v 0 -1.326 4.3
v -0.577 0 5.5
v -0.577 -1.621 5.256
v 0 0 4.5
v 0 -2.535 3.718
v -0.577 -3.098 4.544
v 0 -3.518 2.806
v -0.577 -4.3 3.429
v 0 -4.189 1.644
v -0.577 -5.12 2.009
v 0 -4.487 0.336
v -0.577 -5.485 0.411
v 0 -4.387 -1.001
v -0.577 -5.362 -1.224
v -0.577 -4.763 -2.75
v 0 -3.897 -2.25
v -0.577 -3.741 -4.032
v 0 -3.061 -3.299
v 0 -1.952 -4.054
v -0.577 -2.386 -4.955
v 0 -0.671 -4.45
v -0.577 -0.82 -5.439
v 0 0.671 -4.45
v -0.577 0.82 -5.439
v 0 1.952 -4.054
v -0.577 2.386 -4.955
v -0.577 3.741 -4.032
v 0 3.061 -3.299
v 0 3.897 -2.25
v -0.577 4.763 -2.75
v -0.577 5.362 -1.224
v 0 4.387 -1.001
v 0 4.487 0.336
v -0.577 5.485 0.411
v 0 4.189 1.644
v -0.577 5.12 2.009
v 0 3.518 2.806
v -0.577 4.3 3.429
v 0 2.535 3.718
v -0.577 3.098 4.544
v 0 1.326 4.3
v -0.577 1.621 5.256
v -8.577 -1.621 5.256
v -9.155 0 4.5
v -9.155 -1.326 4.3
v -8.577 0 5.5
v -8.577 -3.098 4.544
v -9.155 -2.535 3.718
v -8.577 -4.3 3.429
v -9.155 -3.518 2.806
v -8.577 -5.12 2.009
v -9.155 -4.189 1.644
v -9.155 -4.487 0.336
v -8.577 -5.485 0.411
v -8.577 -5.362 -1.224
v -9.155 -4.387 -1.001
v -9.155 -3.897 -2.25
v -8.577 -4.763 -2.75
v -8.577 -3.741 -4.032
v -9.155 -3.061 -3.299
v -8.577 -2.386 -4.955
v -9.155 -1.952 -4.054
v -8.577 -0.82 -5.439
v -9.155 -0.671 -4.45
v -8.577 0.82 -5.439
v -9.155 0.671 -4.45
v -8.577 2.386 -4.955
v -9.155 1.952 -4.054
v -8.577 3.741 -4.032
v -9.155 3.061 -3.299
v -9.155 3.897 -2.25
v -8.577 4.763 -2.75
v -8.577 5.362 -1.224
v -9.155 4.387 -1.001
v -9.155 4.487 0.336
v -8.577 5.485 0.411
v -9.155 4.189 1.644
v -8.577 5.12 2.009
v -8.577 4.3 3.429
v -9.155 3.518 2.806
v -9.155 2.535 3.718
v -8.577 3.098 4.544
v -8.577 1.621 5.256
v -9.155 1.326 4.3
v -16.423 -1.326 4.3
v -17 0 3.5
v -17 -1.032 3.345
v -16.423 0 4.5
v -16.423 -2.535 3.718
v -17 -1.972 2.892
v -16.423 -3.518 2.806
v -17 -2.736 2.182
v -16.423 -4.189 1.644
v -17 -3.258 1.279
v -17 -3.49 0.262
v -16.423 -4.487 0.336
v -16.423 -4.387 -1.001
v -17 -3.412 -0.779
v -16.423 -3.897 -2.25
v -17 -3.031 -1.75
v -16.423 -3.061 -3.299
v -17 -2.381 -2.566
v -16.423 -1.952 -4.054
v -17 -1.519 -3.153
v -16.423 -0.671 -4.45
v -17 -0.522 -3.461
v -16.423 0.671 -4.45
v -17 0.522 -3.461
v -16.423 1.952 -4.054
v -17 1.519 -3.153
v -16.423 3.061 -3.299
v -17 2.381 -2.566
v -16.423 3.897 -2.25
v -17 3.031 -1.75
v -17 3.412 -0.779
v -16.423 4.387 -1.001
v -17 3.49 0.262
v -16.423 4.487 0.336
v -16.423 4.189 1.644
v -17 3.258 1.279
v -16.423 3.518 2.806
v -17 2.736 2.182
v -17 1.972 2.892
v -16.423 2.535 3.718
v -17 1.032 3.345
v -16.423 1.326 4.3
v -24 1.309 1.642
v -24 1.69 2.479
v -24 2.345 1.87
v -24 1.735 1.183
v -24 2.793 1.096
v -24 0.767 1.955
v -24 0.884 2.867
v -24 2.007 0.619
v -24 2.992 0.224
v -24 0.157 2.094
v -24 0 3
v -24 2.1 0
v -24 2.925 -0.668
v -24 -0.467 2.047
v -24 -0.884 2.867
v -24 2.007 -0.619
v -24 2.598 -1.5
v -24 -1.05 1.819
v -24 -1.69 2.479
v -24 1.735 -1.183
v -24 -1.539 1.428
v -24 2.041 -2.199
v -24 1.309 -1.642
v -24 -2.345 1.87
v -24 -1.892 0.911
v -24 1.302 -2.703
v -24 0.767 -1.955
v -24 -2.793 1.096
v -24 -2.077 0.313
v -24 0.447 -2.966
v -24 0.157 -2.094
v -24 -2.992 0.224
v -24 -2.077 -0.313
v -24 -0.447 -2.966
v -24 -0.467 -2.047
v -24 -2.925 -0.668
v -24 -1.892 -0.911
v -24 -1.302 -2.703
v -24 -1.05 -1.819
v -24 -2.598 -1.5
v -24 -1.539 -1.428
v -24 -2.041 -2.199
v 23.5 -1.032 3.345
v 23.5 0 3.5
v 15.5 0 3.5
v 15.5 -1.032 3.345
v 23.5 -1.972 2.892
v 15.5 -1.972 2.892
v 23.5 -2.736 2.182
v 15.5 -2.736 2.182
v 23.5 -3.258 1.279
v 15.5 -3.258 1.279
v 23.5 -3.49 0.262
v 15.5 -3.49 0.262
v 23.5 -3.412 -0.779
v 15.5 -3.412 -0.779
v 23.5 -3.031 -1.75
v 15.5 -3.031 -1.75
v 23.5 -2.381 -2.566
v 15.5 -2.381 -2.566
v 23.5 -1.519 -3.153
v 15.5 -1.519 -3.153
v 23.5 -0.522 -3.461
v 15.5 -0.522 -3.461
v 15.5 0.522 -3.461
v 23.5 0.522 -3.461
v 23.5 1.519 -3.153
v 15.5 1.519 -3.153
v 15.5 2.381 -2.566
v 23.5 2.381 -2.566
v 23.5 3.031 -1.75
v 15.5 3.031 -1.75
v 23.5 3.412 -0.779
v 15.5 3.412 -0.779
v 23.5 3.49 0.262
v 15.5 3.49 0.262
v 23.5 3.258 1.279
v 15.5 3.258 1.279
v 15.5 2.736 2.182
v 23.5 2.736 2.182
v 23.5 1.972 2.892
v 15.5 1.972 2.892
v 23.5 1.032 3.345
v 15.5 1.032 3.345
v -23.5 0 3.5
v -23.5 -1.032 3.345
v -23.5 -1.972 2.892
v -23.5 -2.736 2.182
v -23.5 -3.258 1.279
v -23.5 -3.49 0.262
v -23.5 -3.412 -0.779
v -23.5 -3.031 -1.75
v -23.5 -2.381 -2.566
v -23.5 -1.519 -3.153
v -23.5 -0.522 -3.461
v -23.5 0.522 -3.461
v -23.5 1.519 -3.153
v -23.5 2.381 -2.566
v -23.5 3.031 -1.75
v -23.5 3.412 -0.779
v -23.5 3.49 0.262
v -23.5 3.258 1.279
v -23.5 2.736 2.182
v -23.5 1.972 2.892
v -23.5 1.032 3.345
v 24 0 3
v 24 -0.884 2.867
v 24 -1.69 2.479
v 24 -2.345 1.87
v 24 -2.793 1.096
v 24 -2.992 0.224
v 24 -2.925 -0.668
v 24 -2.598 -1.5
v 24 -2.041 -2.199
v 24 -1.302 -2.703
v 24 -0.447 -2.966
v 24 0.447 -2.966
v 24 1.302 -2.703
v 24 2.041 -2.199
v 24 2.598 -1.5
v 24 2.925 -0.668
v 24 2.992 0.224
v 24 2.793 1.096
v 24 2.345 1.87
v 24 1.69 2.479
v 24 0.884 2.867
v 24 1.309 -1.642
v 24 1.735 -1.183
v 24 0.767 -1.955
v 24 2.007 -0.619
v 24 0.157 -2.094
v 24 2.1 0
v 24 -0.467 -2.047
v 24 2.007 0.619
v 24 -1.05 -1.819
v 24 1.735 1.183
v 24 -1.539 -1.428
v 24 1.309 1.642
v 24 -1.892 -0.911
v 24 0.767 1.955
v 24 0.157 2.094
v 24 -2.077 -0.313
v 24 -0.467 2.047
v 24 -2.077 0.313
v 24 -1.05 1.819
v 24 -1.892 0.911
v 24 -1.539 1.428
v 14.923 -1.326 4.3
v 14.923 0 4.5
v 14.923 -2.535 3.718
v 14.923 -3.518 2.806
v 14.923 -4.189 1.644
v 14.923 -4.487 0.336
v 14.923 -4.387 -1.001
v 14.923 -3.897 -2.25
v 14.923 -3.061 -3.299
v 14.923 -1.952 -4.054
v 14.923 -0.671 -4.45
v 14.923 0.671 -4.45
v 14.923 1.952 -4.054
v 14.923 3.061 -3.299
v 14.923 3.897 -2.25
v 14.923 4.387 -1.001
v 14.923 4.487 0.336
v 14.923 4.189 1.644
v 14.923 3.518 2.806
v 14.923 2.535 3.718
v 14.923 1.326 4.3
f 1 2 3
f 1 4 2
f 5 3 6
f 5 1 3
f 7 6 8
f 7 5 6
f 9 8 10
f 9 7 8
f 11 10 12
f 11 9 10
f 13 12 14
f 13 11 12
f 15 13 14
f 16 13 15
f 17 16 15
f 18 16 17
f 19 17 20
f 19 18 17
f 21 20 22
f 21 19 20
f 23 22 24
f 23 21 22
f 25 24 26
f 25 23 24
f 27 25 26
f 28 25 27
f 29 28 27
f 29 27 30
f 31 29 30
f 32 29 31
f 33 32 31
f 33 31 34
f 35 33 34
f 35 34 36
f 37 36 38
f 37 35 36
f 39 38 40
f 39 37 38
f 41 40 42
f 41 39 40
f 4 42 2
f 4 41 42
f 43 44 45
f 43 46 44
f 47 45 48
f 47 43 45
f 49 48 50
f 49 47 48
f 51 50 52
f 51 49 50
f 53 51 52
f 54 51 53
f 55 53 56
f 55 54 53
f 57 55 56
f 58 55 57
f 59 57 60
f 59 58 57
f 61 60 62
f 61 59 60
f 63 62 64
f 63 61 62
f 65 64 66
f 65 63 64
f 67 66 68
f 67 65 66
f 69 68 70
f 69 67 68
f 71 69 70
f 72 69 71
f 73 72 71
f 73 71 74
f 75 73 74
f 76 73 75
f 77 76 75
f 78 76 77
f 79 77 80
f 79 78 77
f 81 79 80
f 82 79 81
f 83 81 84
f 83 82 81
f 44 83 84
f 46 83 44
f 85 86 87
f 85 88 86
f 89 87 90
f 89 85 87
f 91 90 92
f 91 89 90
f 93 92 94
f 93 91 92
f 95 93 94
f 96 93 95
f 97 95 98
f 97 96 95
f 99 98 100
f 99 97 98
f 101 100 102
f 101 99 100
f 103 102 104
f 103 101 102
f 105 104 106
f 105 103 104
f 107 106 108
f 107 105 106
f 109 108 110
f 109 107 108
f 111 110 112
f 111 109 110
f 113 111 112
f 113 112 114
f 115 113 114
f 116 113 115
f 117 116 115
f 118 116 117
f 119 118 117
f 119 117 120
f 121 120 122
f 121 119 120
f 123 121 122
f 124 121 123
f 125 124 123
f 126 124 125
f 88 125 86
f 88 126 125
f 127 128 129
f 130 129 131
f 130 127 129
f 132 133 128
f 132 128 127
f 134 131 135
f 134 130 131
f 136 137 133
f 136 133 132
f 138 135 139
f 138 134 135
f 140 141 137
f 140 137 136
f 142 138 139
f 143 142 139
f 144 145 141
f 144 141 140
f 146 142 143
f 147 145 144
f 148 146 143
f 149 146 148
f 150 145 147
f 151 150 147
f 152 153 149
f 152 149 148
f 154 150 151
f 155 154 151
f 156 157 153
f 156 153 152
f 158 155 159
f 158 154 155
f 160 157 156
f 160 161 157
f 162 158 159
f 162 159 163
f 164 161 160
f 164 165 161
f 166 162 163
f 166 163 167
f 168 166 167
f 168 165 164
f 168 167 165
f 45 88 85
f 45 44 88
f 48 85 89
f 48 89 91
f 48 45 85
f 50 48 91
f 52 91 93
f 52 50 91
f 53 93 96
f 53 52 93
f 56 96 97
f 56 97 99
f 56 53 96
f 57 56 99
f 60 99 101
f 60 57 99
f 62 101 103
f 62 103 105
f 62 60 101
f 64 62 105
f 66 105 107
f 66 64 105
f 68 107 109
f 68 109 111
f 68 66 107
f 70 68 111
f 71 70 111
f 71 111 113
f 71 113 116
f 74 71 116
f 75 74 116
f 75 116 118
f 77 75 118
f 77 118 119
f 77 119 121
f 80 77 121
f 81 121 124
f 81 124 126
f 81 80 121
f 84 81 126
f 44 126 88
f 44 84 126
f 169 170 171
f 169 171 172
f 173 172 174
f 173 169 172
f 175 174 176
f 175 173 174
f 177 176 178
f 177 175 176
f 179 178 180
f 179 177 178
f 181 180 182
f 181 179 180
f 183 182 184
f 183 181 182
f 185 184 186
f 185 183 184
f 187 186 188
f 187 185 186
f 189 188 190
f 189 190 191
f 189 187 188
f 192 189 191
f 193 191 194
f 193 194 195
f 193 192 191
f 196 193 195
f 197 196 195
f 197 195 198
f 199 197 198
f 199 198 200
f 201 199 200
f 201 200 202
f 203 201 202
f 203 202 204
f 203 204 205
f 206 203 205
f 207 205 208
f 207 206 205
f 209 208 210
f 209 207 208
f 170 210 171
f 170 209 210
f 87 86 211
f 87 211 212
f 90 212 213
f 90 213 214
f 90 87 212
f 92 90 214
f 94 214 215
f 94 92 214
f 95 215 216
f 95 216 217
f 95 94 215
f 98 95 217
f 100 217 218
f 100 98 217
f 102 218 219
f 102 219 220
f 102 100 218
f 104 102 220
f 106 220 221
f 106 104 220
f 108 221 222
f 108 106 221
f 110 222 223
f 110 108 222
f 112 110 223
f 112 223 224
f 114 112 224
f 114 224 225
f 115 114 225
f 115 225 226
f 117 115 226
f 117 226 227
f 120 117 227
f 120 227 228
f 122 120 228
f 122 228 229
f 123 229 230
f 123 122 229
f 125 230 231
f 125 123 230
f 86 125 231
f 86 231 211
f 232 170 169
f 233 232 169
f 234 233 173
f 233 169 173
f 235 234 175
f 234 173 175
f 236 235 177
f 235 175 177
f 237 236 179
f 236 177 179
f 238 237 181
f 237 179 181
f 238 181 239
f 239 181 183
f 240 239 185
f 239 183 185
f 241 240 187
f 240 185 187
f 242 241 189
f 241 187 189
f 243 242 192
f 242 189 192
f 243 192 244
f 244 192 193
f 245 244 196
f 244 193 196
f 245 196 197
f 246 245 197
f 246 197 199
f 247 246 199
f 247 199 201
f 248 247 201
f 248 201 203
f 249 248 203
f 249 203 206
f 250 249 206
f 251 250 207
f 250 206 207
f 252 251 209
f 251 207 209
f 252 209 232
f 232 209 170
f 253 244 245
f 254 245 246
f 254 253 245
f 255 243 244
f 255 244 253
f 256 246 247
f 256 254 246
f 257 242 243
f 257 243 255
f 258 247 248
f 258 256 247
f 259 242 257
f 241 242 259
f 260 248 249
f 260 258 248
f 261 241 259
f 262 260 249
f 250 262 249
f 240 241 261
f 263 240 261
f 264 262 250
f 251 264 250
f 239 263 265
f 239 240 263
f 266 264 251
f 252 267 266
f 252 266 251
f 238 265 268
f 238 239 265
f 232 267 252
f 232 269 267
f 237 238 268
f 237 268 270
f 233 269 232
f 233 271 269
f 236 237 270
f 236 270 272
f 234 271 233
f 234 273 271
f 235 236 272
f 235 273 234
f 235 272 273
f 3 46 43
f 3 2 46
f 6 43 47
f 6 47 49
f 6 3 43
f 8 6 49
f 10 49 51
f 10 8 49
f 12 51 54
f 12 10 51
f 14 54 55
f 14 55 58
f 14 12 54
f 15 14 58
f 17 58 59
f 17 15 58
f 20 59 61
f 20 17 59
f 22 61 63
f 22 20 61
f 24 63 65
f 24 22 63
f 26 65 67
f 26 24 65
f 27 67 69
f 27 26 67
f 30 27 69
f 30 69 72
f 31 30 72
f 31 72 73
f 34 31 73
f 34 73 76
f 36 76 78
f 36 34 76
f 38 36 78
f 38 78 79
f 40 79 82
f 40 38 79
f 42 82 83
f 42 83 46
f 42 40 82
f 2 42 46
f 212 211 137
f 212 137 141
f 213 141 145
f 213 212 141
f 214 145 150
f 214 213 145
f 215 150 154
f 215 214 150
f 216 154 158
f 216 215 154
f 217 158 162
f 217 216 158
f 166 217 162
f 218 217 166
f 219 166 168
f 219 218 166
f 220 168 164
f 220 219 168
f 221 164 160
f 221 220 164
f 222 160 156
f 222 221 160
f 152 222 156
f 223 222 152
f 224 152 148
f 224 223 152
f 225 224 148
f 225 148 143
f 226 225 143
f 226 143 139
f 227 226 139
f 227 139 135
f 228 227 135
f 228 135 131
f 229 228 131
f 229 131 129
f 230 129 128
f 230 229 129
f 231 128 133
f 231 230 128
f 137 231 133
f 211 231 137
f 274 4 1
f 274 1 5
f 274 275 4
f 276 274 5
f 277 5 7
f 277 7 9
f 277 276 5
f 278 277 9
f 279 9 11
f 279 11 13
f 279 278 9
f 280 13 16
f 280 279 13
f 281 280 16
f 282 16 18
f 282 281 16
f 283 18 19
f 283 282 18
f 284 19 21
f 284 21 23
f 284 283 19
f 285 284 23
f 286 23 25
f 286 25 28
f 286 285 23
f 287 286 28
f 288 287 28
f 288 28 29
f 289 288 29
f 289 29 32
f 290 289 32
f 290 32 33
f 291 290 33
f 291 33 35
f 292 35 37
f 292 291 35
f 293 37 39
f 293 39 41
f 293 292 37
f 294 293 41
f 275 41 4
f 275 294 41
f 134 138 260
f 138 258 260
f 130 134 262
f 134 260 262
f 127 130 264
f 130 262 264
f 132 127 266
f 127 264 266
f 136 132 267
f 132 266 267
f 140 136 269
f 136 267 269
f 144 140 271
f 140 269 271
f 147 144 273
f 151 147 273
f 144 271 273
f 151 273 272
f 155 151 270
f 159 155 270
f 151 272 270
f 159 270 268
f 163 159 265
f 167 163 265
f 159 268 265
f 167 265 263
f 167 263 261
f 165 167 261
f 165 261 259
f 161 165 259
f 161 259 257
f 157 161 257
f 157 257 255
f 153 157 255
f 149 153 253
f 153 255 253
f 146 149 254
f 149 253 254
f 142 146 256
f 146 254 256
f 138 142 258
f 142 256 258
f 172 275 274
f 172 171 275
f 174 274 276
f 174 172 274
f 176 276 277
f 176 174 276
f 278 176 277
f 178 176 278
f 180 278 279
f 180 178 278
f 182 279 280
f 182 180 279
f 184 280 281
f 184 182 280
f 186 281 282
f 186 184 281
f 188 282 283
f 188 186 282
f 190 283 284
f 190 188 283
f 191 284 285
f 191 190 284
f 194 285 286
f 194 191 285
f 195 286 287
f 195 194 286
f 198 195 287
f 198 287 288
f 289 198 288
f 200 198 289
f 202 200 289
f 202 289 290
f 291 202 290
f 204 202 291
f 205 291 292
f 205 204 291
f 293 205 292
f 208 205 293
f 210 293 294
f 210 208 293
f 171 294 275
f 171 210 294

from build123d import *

# Parameters (mm, degrees)
SKETCH001_R       = 2.1
POCKET_DEPTH      = 24.001
POCKET_DEPTH_BACK = -24.001
CHAMFER_SIZE      = 0.5


with BuildPart() as part:
    # Sketch → Revolution (revolve)
    with BuildSketch(Plane.XZ):
        Polygon((24, 0), (-24, 0), (-24, 3.5), (-17, 3.5), (-16.42265, 4.5), (-9.154701, 4.5), (-8.57735, 5.5), (-0.57735, 5.5), (0, 4.5), (14.92265, 4.5), (15.5, 3.5), (24, 3.5), align=None)
    revolve(axis=Axis((0, 0, 0), (1, 0, 0)))

    # Sketch001 → Pocket (cut, two sides)
    with BuildSketch(Plane.YZ) as pocket_sk:
        Circle(SKETCH001_R)
    extrude(amount=-POCKET_DEPTH, mode=Mode.SUBTRACT)
    extrude(pocket_sk.sketch, amount=-POCKET_DEPTH_BACK, mode=Mode.SUBTRACT)

    # Chamfer
    chamfer_edges = [part.edges().sort_by_distance(p)[0] for p in [
        (-24, 0, -3.5),
        (24, 0, -3.5),
    ]]
    chamfer(chamfer_edges, length=CHAMFER_SIZE)


solid = part.part
